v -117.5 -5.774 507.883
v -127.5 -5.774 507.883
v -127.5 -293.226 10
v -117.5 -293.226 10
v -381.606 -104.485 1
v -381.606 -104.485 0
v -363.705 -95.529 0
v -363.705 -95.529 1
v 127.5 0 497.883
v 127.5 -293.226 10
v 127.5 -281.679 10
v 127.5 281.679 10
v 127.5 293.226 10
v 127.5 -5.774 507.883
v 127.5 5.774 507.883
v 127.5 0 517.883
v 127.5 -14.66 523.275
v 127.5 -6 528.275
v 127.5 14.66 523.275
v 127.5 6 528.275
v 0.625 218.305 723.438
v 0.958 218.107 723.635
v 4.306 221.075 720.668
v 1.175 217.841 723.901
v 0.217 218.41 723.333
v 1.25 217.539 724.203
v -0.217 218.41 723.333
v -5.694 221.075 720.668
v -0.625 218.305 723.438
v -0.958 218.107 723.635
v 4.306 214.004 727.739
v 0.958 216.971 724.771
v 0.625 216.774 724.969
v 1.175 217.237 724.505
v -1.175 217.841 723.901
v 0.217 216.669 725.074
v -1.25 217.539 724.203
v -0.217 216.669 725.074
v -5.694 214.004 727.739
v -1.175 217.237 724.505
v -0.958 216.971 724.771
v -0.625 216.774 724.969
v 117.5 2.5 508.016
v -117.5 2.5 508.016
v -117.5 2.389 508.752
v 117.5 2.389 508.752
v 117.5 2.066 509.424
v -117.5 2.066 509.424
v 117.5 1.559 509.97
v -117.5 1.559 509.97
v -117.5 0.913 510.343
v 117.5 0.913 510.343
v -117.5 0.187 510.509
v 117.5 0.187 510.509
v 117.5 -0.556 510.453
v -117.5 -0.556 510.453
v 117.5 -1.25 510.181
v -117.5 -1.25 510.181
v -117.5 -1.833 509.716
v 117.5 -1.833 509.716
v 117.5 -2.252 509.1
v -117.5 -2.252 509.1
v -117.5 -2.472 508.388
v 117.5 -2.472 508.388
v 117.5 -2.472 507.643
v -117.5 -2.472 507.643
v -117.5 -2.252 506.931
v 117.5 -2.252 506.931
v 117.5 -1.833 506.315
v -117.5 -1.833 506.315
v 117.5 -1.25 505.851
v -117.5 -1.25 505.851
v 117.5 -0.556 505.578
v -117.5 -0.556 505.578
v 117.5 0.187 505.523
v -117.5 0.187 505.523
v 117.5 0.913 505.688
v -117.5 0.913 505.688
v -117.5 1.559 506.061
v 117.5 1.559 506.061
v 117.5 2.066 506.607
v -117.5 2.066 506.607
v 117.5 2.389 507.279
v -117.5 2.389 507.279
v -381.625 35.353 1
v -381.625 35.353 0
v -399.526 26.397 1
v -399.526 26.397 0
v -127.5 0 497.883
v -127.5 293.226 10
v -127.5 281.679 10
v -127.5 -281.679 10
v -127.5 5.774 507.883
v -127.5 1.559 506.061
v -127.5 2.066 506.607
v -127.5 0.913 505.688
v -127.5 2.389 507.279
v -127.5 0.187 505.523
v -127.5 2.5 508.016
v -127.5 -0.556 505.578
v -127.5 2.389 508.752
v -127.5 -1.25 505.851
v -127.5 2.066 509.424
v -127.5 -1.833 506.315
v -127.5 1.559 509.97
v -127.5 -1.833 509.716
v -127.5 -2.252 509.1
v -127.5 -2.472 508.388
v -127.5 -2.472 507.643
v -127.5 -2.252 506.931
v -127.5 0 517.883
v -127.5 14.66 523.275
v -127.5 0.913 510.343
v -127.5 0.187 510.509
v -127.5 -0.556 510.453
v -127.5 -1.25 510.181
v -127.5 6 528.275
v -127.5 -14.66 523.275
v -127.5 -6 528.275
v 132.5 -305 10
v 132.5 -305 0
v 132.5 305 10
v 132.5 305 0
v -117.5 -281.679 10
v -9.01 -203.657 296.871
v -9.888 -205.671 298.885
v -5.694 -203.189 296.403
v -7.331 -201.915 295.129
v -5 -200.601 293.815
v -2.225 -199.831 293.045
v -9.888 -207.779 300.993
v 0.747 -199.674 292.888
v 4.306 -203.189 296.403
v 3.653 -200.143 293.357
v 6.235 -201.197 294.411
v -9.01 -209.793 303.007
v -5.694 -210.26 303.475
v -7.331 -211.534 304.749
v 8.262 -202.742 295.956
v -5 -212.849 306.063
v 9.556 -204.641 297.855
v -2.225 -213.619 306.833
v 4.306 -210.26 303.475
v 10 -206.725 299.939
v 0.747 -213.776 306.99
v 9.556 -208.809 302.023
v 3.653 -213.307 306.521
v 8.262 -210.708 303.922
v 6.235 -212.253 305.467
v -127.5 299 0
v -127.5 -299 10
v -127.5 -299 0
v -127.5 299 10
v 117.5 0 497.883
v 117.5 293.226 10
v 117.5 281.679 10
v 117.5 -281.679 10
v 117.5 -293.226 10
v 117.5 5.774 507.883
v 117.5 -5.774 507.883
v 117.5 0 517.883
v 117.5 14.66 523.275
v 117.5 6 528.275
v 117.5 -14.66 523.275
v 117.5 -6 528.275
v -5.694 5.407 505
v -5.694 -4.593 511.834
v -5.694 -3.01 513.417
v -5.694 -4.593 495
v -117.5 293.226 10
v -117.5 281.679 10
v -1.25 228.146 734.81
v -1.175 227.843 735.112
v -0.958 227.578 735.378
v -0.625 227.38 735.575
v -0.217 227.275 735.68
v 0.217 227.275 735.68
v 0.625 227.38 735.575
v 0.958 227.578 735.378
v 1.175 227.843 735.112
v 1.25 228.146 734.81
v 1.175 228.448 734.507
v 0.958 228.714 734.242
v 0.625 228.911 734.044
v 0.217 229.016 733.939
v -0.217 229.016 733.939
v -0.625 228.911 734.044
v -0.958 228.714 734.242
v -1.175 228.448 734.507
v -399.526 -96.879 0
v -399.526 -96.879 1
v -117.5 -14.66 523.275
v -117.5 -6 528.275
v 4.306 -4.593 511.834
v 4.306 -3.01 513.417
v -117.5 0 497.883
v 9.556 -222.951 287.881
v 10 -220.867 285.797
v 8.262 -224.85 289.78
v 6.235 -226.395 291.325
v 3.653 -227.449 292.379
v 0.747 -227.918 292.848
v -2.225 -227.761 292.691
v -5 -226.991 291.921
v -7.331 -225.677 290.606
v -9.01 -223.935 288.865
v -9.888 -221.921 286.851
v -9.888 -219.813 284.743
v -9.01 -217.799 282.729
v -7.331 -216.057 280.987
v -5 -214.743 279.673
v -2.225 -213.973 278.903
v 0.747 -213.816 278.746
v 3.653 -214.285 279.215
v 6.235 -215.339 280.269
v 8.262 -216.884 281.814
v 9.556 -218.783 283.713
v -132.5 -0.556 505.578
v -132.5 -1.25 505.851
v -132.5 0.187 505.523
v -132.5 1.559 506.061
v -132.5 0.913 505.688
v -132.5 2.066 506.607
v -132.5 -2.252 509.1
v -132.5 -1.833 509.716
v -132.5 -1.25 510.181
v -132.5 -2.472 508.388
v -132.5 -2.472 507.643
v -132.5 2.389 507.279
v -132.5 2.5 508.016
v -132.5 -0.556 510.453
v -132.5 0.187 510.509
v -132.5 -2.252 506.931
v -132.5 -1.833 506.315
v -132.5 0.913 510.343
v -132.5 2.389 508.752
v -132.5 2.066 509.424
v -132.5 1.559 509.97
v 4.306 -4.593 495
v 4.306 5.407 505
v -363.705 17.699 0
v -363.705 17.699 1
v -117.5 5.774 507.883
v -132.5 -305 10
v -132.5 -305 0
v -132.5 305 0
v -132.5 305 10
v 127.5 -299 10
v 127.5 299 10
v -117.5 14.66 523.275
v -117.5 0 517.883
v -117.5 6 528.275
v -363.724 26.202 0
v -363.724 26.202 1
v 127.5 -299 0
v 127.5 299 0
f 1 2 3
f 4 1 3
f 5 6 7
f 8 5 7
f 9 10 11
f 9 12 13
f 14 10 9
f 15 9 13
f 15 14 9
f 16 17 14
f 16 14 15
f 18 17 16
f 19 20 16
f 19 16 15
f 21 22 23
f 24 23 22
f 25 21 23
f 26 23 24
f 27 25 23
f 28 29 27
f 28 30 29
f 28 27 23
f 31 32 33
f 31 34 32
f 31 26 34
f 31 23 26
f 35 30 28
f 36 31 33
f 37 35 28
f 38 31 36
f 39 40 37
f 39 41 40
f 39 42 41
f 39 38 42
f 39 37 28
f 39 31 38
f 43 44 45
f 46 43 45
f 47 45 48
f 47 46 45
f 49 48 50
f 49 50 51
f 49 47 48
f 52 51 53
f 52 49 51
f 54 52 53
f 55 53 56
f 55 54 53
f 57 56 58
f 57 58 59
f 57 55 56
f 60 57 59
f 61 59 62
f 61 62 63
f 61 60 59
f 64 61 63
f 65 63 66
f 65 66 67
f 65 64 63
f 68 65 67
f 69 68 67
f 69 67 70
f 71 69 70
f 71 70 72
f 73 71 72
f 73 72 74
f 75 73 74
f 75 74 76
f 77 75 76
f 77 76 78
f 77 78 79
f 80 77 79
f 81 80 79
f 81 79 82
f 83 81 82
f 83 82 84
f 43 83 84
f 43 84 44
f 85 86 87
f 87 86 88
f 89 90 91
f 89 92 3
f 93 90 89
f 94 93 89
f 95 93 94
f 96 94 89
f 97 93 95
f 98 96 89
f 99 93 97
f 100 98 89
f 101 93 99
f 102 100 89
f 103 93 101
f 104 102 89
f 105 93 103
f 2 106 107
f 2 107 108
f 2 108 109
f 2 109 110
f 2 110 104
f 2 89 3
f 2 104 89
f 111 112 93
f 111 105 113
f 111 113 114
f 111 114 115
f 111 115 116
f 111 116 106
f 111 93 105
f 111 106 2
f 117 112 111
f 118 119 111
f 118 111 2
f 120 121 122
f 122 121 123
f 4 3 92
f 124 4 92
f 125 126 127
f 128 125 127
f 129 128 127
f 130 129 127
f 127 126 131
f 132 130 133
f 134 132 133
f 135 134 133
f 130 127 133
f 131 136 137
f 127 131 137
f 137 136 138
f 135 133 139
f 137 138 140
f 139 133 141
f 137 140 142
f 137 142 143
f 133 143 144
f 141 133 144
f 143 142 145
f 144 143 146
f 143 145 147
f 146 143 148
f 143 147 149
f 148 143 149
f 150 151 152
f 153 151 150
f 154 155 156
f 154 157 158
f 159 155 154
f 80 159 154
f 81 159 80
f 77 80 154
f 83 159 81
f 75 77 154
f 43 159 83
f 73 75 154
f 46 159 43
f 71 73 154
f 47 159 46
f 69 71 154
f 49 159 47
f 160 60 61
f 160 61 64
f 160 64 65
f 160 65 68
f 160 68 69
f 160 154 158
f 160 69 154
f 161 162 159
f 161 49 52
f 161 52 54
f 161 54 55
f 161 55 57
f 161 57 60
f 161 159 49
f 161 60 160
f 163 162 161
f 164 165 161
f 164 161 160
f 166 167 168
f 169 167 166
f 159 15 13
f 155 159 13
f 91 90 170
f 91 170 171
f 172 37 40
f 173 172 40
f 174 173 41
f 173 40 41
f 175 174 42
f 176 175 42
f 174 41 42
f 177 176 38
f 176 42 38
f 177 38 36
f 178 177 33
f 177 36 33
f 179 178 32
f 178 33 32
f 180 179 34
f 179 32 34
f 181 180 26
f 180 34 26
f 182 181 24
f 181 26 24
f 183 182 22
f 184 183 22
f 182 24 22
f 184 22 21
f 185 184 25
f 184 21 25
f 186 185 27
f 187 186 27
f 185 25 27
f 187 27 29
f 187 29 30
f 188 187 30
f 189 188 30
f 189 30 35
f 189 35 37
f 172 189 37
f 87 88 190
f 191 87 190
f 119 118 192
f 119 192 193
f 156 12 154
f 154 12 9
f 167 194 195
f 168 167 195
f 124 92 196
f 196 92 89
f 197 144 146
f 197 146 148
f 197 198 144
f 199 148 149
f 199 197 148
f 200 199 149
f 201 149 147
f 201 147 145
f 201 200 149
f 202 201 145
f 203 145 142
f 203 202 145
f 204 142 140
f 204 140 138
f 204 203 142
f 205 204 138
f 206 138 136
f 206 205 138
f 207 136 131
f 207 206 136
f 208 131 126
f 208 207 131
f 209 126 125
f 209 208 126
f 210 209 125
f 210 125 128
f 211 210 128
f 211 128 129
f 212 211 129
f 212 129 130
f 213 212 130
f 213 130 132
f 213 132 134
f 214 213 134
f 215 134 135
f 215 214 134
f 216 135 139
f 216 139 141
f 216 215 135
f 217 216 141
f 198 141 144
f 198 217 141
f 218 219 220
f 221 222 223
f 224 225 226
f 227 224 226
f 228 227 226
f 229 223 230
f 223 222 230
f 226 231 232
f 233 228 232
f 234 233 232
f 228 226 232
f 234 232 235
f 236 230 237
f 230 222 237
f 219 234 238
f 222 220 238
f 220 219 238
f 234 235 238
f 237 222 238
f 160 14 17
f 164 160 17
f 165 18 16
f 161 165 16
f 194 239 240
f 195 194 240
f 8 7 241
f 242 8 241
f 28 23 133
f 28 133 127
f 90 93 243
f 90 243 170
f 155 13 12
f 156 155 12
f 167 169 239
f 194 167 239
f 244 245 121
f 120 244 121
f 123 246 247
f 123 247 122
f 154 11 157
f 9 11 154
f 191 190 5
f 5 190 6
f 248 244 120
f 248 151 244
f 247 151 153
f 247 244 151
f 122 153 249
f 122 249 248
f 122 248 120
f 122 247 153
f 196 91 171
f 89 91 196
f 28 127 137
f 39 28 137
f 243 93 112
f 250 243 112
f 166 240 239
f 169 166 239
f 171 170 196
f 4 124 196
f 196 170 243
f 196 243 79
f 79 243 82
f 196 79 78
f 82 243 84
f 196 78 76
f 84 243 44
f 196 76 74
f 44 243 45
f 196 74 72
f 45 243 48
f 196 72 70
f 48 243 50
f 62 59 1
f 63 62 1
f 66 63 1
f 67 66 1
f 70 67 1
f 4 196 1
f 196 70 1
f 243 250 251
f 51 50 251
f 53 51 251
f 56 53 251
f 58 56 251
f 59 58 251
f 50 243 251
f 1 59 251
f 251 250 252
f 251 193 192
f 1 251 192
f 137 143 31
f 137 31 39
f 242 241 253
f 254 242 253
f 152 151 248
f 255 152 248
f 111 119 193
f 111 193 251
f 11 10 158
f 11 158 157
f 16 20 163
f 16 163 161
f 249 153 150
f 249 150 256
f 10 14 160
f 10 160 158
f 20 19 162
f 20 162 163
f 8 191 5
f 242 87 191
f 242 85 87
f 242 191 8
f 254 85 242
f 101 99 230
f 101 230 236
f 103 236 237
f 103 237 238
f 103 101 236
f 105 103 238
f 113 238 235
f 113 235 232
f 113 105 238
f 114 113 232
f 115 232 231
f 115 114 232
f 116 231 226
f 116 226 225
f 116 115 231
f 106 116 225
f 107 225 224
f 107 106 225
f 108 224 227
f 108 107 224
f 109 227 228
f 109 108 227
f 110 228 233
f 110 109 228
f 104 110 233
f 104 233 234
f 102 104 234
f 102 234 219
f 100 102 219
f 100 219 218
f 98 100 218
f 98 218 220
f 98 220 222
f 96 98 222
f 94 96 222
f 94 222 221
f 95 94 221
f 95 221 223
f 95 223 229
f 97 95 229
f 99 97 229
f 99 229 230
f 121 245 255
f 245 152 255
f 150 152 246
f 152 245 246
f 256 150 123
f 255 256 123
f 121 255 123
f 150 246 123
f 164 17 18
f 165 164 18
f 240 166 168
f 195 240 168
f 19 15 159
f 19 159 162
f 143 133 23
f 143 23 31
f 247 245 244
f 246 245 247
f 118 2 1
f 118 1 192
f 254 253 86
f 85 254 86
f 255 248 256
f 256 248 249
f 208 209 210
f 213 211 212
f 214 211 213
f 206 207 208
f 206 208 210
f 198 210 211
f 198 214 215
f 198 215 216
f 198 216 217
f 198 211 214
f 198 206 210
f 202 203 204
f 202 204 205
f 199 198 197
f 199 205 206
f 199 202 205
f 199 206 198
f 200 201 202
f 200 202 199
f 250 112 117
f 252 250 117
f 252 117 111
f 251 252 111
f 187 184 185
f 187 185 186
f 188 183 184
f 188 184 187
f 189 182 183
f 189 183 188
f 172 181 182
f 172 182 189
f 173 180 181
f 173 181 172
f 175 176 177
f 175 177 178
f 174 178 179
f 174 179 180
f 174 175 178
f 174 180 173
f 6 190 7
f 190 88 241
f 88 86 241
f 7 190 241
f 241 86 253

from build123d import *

# Parameters (mm, degrees)
F0_W         = 265
F0_H         = 610
F1_DEPTH     = 10
F2_W         = 255
F2_H         = 598
F3_DEPTH     = 25
F5_DEPTH     = 10
F8_R         = 2.5
F9_DEPTH     = 260
F10_W        = 10
F10_H        = 10
F11_DEPTH    = 520
F12_T1_DEPTH = 87.150489639
F13_W        = 10
F13_H        = 10
F14_DEPTH    = 305
F15_W        = 10
F15_H        = 478.3019721508
F16_DEPTH    = 25
F18_DEPTH    = 25
F20_DEPTH    = 25
F22_R        = 10
F23_DEPTH    = 10
F21_R        = 1.25
F24_DEPTH    = 15
F26_DEPTH    = 1


# Not quite as in the source:
# - a fillet or chamfer that OpenCascade refuses, or shapes differently, is made with other operations: its cross-section is extruded or revolved along the edge and cut away or added


with BuildPart() as f1:
    # F0 (on Top) → F1 (new body)
    with BuildSketch(Plane.XY):
        Rectangle(F0_W, F0_H)
    extrude(amount=F1_DEPTH)

    # F2 (on face) → F3 (cut)
    with BuildSketch(Plane.XY.offset(10)):
        Rectangle(F2_W, F2_H)
    extrude(amount=-F3_DEPTH, mode=Mode.SUBTRACT)


with BuildPart() as f5:
    # F4 (on face) → F5 (new body)
    with BuildSketch(Plane.YZ.offset(-127.5)):
        Polygon((6, 528.2754963085), (-293.2264973081, 10), (-281.6794919243, 10), (14.6602540378, 523.2754963085), align=None)
    extrude(amount=F5_DEPTH)


with BuildPart() as f6_1:
    # F6: instance of F5
    add(f5.part.mirror(Plane.YZ))


with BuildPart() as f7_1:
    # F7: instance of F5
    add(f5.part.mirror(Plane.XZ))


with BuildPart() as f7_2:
    # F7: instance of F6_1
    add(f6_1.part.mirror(Plane.XZ))


with BuildPart() as f5_1:
    add(f5.part)

    add(f6_1.part)  # F9 merges F6_1

    add(f7_1.part)  # F9 merges F7_1

    add(f7_2.part)  # F9 merges F7_2
    # F8 (on face) → F9 (join)
    with BuildSketch(Plane.YZ.offset(127.5)):
        with Locations((0, 508.0155730247)):
            Circle(F8_R)
    extrude(amount=-F9_DEPTH)


with BuildPart() as f11:
    # F10 (on Top) → F11 (new body)
    with BuildSketch(Plane.XY):
        with Locations((-0.6940327585, 0.4071239119)):
            Rectangle(F10_W, F10_H)
    extrude(amount=F11_DEPTH)

    # F12: chamfer of 15 on 1 edges, made by hand

    # F12_s2 → F12_t1 (cut)
    with BuildSketch(Plane.YZ.offset(-44.269277578)):
        Polygon((5.4071239119, 505), (-9.5928760881, 520), (5.4071239119, 520), align=None)
    extrude(amount=F12_T1_DEPTH, mode=Mode.SUBTRACT)

    # F15 (on face) → F16 (cut)
    with BuildSketch(Plane.YZ.offset(4.3059672415)):
        with Locations((0.4071239119, 239.1509860754)):
            Rectangle(F15_W, F15_H)
    extrude(amount=-F16_DEPTH, mode=Mode.SUBTRACT)

    # F17 (on face) → F18 (cut)
    with BuildSketch(Plane.YZ.offset(4.3059672415)):
        Polygon((5.4071239119, 478.3019721508), (5.4071239119, 505), (-4.5928760881, 495), (-4.5928760881, 478.3019721508), align=None)
    extrude(amount=-F18_DEPTH, mode=Mode.SUBTRACT)

    # F19 (on face) → F20 (cut)
    with BuildSketch(Plane.YZ.offset(4.3059672415)):
        Polygon((3.574793685, 520), (-4.5928760881, 520), (-4.5928760881, 511.8337869644), align=None)
    extrude(amount=-F20_DEPTH, mode=Mode.SUBTRACT)


with BuildPart() as f14:
    # F13 (on face) → F14 (new body, symmetric)
    with BuildSketch(Plane(origin=(0, 255.2035619559, 255.2035619559), x_dir=(-1, 0, 0), z_dir=(0, 0.7071067812, 0.7071067812))):
        with Locations((0.6940327585, 358.2655105144)):
            Rectangle(F13_W, F13_H)
    extrude(amount=F14_DEPTH, both=True)

    # F22 (on face) → F23 (join, symmetric)
    with BuildSketch(Plane(origin=(0, 39.535993694, 39.535993694), x_dir=(1, 0, 0), z_dir=(0, -0.7071067812, -0.7071067812))):
        with Locations((0, 358.2655105144)):
            Circle(F22_R)
    extrude(amount=F23_DEPTH, both=True)

    # F21 (on face) → F24 (join)
    with BuildSketch(Plane(origin=(0, 470.8711302178, 470.8711302178), x_dir=(-1, 0, 0), z_dir=(0, 0.7071067812, 0.7071067812))):
        with Locations((0, 358.2655105144)):
            Circle(F21_R)
    extrude(amount=F24_DEPTH)


with BuildPart() as f26:
    # F25 (on Top) → F26 (new body)
    with BuildSketch(Plane.XY):
        Polygon((-399.5258836659, 26.3972045484), (-399.5258836659, 20.4128491475), (-399.5258836659, -89.8914735812), (-399.5258836659, -96.8788117204), (-381.6058932129, -104.4853963744), (-363.7048708642, -95.5293477292), (-363.7048708642, -90.8532628168), (-363.7048708642, 17.6992724711), (-363.7238389685, 26.2021424537), (-381.6248613172, 35.3532531936), align=None)
    extrude(amount=F26_DEPTH)


solid = Compound([f1.part, f5_1.part, f11.part, f14.part, f26.part])
